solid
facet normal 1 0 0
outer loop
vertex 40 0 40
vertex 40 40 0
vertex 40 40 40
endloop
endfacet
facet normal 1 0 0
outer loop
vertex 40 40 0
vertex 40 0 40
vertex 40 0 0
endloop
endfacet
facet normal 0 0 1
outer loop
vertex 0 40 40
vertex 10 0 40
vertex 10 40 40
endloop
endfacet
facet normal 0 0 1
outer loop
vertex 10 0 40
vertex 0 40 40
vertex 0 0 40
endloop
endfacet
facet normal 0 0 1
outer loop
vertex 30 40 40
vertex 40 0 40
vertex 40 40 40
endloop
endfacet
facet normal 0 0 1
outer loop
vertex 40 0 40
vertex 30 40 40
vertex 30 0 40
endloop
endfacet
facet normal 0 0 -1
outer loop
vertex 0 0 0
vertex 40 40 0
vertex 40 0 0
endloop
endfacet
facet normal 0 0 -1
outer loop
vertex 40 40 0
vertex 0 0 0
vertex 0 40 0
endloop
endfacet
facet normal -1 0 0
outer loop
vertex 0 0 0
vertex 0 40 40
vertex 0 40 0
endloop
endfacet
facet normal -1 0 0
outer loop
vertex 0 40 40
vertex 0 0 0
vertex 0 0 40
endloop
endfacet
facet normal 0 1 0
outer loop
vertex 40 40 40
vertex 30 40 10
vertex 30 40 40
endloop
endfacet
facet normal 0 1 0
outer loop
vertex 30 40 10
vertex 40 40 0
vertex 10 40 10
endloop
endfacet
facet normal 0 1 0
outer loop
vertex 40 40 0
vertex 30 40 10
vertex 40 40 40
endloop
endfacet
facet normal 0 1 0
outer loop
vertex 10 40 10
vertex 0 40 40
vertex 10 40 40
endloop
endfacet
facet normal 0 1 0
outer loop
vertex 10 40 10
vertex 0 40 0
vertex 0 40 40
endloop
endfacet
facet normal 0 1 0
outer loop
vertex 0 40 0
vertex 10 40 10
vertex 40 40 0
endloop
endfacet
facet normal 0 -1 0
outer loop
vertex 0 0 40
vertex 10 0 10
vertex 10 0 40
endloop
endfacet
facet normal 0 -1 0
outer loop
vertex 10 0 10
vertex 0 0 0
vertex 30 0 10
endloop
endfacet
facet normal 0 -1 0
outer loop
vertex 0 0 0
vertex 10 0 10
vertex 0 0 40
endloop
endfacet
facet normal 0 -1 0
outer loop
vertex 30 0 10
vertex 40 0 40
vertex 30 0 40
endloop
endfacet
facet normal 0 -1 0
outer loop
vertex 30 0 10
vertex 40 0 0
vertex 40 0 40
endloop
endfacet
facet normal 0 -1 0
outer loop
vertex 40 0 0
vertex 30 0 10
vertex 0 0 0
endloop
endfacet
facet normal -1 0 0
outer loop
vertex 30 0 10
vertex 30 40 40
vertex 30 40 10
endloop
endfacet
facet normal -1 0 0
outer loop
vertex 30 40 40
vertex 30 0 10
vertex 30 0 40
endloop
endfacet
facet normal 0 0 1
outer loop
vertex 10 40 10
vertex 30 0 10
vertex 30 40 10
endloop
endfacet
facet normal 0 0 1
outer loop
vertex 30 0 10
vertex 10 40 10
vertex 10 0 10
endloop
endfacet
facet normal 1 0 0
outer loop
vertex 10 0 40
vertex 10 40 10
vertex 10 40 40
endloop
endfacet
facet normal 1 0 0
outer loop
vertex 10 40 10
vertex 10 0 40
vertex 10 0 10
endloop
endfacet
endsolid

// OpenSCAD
difference(){

cube([40,40,40]);
translate([10,0,10])
cube([20,40,30]);

}
